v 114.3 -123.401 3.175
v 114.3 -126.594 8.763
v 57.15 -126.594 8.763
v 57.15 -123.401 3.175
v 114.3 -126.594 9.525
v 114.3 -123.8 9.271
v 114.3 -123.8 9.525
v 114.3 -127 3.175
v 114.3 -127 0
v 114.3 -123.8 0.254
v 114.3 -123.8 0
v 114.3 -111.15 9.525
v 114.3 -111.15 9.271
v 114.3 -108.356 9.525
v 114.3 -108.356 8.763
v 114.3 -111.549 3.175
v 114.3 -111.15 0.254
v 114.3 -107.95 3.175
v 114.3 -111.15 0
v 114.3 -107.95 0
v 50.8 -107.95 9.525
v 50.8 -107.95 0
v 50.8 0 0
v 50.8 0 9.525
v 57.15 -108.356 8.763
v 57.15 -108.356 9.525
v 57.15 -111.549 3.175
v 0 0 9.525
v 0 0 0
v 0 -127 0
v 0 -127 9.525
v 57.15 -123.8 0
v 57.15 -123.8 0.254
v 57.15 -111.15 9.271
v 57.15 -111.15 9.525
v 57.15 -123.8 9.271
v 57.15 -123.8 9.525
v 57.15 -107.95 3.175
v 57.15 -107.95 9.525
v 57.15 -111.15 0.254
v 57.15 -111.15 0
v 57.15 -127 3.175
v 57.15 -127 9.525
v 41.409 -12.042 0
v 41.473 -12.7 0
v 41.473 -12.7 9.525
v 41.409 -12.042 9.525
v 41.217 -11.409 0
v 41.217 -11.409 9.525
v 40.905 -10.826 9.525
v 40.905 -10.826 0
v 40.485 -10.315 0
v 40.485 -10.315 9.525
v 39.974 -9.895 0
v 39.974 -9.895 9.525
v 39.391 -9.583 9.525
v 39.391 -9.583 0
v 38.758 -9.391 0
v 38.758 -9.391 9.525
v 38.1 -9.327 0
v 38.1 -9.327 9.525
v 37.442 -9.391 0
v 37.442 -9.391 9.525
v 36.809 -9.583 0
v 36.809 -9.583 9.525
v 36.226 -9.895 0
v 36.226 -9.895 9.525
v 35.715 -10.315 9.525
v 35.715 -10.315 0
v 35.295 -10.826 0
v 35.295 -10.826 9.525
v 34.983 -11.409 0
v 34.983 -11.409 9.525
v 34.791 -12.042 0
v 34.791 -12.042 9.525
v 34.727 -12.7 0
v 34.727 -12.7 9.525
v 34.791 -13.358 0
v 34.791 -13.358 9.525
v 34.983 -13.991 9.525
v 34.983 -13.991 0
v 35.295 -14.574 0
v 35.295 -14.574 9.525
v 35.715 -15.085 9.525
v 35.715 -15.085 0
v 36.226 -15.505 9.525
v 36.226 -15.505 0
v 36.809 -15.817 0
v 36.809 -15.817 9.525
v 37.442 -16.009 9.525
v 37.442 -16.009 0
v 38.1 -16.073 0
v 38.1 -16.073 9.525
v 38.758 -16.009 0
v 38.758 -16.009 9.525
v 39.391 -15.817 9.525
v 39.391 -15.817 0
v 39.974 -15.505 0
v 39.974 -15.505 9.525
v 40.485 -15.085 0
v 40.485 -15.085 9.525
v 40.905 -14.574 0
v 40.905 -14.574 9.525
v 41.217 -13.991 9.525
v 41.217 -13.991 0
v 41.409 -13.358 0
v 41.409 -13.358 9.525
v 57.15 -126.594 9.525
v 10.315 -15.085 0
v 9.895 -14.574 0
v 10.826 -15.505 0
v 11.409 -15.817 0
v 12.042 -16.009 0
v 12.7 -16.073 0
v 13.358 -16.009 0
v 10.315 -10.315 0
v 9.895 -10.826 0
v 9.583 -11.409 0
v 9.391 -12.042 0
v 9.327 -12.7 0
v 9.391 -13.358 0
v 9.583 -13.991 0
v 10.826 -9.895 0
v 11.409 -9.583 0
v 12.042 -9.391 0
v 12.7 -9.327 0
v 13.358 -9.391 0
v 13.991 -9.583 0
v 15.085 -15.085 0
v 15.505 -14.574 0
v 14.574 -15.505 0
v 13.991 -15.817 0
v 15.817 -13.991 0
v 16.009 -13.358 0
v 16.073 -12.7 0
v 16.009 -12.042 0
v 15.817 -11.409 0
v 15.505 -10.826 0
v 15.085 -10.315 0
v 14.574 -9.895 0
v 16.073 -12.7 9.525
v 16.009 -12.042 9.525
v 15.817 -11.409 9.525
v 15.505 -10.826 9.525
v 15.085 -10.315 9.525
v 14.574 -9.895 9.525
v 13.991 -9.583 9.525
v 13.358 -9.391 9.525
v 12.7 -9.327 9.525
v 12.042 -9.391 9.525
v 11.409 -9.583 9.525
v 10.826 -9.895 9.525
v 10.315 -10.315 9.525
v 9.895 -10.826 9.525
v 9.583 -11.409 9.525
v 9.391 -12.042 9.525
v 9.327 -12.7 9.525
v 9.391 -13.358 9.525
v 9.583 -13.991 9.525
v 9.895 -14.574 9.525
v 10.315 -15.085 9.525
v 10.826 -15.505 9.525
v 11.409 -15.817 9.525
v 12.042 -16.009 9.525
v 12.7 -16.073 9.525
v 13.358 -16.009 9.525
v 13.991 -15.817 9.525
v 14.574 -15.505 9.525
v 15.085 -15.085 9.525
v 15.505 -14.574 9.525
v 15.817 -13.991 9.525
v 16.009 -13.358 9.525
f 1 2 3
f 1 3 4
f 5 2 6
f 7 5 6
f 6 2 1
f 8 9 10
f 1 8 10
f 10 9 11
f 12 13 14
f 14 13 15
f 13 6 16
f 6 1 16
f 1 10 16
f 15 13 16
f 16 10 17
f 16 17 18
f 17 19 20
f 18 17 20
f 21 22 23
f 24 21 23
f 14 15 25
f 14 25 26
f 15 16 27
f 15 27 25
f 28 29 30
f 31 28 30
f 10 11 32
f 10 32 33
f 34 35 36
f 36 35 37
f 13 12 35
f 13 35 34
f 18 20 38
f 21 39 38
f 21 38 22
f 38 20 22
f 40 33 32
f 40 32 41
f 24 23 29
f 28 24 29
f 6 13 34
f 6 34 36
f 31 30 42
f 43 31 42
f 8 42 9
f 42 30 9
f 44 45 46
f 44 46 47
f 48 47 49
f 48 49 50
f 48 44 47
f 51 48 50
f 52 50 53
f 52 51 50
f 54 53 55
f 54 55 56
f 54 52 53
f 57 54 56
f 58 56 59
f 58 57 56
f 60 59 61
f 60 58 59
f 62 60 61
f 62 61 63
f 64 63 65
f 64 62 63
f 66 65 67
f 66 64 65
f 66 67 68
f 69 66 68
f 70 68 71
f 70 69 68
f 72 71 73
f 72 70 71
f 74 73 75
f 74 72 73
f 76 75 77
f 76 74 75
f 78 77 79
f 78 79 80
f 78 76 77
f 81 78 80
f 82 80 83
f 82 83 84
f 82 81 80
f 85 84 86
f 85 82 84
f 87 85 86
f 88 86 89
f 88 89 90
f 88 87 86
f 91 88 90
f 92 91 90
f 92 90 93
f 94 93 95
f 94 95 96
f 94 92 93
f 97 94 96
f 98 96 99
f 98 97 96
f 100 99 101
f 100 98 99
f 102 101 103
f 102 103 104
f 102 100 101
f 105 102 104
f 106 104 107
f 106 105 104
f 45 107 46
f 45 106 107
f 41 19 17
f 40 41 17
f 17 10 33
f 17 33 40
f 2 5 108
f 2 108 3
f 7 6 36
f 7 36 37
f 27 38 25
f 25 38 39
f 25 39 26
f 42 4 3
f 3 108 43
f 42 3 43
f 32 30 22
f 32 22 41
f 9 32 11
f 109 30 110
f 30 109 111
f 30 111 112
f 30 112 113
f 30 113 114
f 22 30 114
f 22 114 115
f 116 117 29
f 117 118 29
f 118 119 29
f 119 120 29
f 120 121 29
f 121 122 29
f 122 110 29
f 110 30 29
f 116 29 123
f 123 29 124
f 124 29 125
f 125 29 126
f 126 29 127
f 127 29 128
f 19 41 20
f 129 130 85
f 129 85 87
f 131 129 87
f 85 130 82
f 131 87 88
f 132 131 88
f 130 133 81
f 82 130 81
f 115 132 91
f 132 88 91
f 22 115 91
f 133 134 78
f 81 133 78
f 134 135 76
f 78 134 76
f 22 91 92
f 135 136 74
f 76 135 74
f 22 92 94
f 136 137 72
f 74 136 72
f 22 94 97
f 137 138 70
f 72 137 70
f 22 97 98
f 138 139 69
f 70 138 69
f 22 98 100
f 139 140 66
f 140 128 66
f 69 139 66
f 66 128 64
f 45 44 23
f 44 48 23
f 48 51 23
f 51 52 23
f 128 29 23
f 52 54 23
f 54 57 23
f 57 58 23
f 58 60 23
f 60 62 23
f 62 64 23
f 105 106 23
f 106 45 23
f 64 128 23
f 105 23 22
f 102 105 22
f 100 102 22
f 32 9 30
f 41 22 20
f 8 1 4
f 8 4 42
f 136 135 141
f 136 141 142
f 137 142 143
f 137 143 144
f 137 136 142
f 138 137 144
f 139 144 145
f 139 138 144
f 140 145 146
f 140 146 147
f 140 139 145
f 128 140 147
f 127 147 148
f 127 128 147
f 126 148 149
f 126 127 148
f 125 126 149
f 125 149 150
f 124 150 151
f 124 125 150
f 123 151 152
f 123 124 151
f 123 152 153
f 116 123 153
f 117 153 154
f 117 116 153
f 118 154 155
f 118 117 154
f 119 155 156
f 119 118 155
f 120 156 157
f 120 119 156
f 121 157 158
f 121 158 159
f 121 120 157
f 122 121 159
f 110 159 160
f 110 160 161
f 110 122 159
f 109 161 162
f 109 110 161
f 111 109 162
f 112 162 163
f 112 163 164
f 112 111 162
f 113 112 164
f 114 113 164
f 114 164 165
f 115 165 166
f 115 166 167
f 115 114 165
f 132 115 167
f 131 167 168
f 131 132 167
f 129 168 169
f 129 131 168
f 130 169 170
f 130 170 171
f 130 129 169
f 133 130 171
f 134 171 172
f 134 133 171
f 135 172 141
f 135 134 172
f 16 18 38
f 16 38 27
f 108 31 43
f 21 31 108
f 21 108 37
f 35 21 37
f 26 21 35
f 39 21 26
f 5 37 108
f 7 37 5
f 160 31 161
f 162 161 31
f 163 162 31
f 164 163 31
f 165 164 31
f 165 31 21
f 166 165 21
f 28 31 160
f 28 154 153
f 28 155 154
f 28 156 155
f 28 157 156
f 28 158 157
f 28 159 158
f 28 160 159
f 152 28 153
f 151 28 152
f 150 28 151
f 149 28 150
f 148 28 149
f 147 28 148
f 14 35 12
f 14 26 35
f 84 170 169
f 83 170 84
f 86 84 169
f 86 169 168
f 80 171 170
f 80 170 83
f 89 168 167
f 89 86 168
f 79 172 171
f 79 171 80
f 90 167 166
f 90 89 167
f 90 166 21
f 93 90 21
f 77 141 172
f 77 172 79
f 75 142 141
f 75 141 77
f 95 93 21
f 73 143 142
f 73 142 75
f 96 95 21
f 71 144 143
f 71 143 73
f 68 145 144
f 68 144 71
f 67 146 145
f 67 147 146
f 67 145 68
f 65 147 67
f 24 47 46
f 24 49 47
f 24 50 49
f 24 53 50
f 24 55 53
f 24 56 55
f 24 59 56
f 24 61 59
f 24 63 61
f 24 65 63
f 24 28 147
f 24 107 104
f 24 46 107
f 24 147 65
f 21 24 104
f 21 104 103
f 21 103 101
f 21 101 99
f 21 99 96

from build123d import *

# Parameters (mm, degrees)
SKETCH_R     = 3.373437
PAD_DEPTH    = 9.525
SKETCH001_W  = 12.6492
SKETCH001_H  = 0.254
POCKET_DEPTH = 57.15


with BuildPart() as part:
    # Sketch → Pad (new body)
    with BuildSketch(Plane.XY):
        Polygon((50.8, 0), (0, 0), (0, -127), (114.3, -127), (114.3, -107.95), (50.8, -107.95), align=None)
        with Locations((12.7, -12.7)):
            Circle(SKETCH_R, mode=Mode.SUBTRACT)
        with Locations((38.1, -12.7)):
            Circle(SKETCH_R, mode=Mode.SUBTRACT)
    extrude(amount=PAD_DEPTH)

    # Sketch001 → Pocket (cut)
    with BuildSketch(Plane.YZ.offset(114.3)):
        Polygon((-126.5936, 8.763), (-123.40082, 3.175), (-127, 3.175), (-127, 12.7), (-107.95, 12.7), (-107.95, 3.175), (-111.54918, 3.175), (-108.3564, 8.763), (-108.3564, 9.525), (-111.1504, 9.525), (-111.1504, 9.271), (-123.7996, 9.271), (-123.7996, 9.525), (-126.5936, 9.525), align=None)
        with Locations((-117.475, 0.127)):
            Rectangle(SKETCH001_W, SKETCH001_H)
    extrude(amount=-POCKET_DEPTH, mode=Mode.SUBTRACT)


solid = part.part
